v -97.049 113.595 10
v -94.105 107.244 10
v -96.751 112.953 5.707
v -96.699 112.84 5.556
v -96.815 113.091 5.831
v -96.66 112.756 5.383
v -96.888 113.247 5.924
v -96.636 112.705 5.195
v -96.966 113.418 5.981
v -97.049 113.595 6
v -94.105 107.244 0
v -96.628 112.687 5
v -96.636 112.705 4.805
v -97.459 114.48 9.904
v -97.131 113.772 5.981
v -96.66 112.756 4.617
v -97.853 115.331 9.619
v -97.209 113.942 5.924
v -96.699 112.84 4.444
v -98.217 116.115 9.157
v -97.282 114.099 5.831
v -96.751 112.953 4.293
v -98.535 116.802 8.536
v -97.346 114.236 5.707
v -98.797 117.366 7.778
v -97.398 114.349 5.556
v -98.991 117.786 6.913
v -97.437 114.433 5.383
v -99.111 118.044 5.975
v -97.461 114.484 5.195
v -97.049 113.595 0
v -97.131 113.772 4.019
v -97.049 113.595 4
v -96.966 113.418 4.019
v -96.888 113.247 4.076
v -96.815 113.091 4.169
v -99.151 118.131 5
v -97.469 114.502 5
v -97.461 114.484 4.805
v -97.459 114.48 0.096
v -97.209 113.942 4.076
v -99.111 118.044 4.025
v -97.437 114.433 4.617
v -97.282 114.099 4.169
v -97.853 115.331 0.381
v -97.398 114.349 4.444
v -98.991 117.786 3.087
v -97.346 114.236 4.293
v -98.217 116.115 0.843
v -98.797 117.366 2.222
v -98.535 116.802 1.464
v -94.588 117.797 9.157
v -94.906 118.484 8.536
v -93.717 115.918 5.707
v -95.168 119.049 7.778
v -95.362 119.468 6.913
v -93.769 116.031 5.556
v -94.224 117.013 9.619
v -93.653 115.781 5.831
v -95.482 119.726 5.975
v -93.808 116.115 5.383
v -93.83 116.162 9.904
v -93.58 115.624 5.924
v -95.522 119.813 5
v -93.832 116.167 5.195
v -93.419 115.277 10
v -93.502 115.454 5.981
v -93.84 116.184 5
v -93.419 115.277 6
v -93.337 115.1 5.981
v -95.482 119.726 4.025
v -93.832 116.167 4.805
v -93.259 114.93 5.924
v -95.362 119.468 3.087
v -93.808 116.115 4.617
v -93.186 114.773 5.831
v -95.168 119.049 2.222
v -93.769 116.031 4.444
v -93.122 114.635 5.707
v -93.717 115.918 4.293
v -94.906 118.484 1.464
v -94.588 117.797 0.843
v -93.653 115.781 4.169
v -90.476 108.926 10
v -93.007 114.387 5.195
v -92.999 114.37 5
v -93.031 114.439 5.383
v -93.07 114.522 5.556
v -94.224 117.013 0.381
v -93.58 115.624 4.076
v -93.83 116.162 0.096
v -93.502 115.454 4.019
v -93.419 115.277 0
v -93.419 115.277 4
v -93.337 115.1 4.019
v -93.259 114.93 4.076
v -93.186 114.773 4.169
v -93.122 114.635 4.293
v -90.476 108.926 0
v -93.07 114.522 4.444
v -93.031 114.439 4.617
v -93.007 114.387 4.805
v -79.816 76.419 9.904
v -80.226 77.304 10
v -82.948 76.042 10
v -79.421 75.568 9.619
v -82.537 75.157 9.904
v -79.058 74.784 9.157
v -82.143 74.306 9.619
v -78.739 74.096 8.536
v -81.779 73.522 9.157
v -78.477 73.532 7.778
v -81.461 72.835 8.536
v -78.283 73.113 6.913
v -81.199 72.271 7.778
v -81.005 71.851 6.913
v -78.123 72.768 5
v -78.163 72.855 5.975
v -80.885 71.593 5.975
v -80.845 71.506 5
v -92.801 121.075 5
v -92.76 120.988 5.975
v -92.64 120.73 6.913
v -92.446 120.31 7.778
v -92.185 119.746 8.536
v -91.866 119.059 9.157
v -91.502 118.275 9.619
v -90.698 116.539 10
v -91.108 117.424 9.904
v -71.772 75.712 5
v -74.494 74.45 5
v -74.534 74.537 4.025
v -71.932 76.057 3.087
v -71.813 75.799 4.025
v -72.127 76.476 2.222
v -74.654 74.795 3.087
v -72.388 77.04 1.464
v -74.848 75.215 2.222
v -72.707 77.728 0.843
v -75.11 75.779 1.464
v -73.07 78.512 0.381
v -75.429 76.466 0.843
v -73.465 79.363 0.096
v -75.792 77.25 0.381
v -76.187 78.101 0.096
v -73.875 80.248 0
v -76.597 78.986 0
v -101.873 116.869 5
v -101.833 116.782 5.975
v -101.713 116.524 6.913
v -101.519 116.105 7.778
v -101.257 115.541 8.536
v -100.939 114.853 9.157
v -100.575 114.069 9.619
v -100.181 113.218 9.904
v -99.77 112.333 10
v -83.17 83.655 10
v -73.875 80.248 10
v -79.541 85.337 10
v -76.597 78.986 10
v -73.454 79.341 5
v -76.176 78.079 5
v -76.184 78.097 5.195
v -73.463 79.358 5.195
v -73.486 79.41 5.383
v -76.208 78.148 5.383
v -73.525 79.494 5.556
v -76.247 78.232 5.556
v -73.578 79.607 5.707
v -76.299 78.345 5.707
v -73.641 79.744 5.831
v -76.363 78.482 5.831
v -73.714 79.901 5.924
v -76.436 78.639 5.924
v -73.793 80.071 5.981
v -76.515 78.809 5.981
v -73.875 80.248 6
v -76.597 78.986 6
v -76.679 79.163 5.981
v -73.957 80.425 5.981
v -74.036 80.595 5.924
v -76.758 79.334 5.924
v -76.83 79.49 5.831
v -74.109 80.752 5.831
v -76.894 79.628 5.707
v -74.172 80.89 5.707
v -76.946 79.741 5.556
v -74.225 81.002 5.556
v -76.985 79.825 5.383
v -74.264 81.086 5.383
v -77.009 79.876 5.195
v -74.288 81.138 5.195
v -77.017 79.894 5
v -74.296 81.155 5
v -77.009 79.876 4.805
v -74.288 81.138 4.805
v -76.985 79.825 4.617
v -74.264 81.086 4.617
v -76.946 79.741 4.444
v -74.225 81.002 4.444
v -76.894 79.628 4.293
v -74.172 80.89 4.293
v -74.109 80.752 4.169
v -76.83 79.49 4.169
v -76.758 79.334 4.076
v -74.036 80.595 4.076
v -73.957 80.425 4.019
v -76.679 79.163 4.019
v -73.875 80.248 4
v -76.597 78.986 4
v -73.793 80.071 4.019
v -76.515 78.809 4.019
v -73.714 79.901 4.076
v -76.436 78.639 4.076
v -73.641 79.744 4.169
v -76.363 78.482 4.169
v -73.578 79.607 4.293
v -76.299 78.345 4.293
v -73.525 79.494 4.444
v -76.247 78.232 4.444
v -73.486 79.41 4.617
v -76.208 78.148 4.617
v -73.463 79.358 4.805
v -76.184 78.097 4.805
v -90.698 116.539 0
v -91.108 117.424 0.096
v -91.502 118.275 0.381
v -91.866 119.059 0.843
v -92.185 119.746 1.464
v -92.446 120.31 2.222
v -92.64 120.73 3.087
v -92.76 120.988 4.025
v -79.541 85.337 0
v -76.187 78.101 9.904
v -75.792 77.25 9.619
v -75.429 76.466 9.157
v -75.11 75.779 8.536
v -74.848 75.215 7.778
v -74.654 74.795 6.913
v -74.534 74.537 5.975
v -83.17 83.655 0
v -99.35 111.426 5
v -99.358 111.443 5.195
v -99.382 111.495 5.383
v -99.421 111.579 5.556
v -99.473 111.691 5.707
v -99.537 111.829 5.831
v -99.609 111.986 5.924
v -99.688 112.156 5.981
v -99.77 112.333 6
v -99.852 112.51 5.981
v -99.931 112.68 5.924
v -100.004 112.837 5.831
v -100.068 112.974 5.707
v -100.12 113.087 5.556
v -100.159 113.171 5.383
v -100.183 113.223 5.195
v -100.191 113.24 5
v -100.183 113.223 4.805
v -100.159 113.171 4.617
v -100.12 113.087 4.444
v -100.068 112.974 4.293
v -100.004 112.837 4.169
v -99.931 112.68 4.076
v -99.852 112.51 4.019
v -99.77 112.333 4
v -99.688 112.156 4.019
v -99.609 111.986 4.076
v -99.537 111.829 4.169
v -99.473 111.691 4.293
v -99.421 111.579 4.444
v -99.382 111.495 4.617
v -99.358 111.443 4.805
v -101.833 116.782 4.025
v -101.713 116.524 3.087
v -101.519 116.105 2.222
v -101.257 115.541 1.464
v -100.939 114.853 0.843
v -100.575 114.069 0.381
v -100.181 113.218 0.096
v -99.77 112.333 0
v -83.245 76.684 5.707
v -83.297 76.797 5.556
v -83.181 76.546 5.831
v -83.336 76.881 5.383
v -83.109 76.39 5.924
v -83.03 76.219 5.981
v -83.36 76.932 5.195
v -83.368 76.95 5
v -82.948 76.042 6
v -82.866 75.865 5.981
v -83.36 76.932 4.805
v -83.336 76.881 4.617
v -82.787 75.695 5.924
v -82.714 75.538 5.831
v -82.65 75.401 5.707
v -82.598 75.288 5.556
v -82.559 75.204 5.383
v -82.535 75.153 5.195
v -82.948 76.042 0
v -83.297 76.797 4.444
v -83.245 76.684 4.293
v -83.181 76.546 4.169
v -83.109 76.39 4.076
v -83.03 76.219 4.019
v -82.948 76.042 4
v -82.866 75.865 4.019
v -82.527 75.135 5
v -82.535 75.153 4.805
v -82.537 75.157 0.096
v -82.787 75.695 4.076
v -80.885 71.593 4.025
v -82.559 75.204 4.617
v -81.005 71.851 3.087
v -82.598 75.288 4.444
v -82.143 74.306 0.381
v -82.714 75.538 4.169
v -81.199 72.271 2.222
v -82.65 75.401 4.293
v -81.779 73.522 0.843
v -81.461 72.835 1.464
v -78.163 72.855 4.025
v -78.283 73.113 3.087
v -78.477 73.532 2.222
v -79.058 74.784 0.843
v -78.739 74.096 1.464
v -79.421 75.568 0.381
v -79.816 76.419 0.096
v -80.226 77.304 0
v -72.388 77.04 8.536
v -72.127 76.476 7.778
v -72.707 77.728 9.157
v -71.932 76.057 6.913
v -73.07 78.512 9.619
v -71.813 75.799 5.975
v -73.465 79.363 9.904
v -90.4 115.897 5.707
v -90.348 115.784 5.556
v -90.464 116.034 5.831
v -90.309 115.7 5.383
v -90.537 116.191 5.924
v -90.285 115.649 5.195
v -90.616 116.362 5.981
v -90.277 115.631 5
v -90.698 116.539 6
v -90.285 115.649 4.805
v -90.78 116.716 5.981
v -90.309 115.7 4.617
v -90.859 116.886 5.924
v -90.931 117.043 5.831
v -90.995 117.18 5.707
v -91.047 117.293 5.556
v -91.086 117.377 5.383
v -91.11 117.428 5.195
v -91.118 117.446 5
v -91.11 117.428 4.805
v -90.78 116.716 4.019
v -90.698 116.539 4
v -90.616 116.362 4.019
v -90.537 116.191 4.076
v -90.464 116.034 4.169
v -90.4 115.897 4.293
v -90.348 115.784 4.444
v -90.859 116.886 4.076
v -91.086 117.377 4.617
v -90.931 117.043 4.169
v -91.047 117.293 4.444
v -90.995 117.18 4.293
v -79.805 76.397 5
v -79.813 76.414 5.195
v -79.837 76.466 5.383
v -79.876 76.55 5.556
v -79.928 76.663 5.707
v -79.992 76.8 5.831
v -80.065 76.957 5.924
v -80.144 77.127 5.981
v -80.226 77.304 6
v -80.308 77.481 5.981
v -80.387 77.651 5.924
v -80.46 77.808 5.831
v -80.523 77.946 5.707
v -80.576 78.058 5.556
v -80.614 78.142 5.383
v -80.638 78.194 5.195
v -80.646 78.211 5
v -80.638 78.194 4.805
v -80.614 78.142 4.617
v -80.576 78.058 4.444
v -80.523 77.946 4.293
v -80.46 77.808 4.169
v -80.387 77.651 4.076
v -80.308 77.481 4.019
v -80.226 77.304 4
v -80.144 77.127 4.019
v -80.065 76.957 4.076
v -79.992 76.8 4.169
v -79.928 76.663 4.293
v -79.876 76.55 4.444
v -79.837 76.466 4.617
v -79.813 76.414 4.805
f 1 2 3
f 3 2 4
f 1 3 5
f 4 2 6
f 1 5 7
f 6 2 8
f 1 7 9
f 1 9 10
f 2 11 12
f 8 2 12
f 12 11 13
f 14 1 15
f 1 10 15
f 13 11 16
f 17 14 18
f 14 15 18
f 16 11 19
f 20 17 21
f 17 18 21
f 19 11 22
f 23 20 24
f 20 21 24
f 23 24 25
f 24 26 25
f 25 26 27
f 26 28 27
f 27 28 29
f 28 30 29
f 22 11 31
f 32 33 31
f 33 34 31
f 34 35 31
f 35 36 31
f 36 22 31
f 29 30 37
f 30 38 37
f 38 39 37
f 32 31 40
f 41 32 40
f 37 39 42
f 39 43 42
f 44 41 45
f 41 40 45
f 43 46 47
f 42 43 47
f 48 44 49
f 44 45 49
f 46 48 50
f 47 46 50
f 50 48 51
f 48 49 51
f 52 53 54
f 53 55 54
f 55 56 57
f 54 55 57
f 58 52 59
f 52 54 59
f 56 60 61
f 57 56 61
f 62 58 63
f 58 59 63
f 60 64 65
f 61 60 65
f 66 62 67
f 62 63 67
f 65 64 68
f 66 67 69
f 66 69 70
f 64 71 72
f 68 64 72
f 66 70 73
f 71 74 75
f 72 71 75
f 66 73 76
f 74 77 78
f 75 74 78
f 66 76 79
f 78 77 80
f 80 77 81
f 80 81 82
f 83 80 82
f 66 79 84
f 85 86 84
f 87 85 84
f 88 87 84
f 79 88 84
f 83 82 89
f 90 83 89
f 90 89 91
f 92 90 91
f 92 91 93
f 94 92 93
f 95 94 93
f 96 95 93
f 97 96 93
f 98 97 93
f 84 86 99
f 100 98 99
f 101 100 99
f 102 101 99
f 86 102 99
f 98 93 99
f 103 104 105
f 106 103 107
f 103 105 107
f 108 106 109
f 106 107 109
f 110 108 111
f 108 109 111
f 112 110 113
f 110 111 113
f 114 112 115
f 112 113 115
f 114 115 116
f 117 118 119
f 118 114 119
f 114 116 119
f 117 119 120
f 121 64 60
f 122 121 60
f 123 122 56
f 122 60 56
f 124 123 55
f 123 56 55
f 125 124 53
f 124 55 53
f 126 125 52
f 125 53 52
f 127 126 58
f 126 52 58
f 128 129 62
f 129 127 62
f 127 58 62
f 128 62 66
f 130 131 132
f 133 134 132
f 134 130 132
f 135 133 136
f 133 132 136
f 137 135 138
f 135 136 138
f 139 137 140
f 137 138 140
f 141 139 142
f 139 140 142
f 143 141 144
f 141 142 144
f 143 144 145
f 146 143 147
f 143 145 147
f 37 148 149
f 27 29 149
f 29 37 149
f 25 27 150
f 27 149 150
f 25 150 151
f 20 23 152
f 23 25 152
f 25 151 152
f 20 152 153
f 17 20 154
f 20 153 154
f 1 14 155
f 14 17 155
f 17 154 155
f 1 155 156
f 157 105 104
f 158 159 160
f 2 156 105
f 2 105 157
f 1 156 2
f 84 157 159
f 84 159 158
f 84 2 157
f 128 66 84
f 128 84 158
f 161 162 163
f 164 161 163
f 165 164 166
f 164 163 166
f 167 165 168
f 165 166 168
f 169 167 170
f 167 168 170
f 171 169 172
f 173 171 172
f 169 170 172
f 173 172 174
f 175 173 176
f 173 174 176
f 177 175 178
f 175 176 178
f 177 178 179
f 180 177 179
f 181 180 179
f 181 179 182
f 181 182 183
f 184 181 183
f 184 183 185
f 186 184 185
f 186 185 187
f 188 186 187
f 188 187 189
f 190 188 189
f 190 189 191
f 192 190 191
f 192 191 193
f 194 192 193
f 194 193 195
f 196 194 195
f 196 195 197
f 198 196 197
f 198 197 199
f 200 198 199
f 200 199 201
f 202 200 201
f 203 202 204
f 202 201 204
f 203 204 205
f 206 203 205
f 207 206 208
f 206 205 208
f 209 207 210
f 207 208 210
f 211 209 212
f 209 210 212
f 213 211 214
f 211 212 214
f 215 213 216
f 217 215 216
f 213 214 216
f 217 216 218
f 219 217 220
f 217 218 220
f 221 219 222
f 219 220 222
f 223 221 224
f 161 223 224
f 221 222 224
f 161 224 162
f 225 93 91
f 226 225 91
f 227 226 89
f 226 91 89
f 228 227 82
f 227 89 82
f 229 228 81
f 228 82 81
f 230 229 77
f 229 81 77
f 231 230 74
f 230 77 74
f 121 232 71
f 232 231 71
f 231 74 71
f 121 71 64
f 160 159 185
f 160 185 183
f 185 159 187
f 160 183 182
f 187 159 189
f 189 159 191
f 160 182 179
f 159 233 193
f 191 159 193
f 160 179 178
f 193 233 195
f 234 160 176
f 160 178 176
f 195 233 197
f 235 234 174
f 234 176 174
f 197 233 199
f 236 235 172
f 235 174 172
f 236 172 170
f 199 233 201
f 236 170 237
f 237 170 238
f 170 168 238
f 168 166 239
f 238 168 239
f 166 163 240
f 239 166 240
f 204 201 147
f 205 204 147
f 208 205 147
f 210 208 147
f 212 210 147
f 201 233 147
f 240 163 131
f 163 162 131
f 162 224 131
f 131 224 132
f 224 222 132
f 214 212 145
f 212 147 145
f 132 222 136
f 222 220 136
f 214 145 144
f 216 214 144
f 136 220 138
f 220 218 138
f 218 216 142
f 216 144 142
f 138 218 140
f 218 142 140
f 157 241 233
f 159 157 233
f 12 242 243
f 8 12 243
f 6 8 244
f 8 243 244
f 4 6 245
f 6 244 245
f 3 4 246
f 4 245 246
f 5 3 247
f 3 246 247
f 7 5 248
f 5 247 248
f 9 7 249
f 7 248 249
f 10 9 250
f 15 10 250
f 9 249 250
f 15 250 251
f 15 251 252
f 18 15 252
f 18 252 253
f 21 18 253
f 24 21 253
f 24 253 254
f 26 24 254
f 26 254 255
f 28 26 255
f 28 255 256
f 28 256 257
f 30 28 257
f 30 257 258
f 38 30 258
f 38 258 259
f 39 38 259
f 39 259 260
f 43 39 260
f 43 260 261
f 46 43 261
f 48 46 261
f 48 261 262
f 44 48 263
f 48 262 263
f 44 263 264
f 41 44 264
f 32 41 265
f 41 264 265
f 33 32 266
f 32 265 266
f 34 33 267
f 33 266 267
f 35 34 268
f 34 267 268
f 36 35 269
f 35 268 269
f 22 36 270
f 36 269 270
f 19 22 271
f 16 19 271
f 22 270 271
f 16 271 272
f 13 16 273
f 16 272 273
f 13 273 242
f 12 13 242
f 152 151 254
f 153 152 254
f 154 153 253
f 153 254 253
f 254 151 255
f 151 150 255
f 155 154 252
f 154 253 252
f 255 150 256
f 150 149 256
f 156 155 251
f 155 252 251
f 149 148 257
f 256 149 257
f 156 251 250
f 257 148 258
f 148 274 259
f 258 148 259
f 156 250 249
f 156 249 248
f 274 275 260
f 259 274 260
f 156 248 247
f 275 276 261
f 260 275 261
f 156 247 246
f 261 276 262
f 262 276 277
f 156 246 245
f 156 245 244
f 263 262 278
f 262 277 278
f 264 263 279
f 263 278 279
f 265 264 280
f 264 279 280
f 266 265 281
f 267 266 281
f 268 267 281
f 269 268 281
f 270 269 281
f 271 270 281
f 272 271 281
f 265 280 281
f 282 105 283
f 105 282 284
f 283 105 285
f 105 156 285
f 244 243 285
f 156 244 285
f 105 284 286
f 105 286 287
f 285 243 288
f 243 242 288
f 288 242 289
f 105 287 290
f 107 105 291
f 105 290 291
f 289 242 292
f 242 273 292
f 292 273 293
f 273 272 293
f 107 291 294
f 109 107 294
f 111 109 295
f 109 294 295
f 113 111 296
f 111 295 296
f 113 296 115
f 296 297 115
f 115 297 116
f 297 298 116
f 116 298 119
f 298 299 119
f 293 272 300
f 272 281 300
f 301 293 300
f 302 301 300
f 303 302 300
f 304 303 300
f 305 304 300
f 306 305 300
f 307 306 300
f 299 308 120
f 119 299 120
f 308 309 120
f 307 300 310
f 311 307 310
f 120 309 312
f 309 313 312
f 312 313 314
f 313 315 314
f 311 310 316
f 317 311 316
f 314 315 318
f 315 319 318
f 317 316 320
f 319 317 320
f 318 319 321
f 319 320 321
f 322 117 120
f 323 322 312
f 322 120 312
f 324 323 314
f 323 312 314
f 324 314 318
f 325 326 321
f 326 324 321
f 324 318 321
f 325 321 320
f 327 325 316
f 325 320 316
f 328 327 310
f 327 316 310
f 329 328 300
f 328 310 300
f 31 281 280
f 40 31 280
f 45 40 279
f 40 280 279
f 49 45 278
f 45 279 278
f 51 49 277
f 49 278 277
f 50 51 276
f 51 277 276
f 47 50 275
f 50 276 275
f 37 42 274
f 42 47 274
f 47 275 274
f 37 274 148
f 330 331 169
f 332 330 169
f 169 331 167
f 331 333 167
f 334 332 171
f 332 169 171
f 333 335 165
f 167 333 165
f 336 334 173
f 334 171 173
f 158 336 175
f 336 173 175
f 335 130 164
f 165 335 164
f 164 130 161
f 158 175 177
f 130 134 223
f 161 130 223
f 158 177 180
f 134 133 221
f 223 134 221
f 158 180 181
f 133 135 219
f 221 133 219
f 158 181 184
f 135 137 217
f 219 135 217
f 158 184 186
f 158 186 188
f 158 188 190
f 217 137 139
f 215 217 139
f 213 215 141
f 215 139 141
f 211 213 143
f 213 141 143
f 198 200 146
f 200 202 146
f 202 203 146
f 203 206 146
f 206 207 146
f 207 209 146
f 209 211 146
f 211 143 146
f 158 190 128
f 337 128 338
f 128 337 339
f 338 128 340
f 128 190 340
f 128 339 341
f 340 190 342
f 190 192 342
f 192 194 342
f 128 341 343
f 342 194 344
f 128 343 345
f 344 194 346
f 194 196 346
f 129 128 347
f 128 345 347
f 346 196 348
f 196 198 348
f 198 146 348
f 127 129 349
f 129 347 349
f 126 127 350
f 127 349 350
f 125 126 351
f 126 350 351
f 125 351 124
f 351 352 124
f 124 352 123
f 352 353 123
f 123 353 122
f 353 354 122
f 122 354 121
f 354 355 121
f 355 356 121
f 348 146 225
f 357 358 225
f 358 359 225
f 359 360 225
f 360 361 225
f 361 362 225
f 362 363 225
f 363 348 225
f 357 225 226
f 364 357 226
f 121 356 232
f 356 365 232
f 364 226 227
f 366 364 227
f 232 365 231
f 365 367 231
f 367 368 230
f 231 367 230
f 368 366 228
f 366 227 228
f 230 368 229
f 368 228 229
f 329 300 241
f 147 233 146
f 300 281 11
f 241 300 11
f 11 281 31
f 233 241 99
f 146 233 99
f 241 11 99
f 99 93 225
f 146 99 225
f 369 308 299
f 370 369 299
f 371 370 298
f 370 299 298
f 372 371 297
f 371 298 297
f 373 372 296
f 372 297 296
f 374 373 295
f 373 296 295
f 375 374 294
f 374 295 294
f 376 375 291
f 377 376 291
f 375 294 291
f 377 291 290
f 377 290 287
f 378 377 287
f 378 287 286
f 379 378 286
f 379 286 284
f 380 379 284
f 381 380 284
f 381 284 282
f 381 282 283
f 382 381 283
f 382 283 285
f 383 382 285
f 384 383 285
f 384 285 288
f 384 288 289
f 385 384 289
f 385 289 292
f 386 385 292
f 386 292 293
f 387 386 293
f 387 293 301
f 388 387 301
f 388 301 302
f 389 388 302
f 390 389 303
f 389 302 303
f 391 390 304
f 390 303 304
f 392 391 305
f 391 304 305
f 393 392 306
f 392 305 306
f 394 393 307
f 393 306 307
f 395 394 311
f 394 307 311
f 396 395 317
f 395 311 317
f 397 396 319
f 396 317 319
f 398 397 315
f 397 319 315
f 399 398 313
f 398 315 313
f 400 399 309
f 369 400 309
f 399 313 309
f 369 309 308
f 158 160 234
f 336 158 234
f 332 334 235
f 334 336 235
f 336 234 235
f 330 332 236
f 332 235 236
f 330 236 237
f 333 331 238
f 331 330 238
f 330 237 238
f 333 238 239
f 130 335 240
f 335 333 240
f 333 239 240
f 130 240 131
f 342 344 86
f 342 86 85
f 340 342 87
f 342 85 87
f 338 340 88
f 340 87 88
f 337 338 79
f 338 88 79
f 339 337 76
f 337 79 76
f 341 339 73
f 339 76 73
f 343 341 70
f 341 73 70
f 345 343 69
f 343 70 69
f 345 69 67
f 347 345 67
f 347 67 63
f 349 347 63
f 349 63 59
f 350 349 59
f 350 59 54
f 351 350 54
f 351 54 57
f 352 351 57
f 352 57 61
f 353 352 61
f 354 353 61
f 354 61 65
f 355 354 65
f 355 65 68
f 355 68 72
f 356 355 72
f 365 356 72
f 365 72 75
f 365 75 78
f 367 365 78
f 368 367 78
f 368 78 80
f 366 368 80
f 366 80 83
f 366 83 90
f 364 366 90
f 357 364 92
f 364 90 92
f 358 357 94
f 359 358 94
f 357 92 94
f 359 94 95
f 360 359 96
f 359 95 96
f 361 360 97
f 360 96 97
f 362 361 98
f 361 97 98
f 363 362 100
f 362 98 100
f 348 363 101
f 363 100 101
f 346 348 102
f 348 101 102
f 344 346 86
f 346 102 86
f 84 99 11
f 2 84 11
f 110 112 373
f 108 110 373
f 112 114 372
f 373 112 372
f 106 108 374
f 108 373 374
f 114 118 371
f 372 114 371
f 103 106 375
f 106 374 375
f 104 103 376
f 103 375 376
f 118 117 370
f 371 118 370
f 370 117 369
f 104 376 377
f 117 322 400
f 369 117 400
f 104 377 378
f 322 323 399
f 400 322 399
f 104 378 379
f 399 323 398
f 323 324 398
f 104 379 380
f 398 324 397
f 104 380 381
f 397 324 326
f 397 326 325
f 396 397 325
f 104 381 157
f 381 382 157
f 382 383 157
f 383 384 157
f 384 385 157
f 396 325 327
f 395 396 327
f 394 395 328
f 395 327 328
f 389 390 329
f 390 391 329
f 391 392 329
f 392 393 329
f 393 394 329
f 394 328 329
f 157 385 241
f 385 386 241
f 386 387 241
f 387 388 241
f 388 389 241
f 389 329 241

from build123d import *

# Parameters (mm, degrees)
BOSS_EXTRU_1_DEPTH      = 10
ESQUISSE2_R             = 1
ENL_V_MAT_EXTRU_1_DEPTH = 20


with BuildPart() as part:
    # Esquisse1 → Boss.-Extru.1 (new body)
    with BuildSketch(Plane.XY):
        Polygon((-99.151357472, 118.130872671), (-101.873142366, 116.869172631), (-80.844808358, 71.506091068), (-78.123023465, 72.767791109), (-83.169823626, 83.654930684), (-79.540777101, 85.337197404), (-74.49397694, 74.450057829), (-71.772192046, 75.71175787), (-92.800526053, 121.074839432), (-95.522310947, 119.813139392), (-90.475510785, 108.925999817), (-94.10455731, 107.243733096), align=None)
    extrude(amount=BOSS_EXTRU_1_DEPTH)

    # Esquisse2 → Enlèv. mat.-Extru.1 (cut)
    with BuildSketch(Plane(origin=(-39.261124148, -18.199734313, 0), x_dir=(0, 0, 1), z_dir=(-0.9072616312569982, -0.42056668014583676, 0))):
        with BuildLine():
            ThreePointArc((0, 143.875365486), (1.464466094, 147.410899392), (5, 148.875365486))
            Line((5, 148.875365486), (0, 148.875365486))
            Line((0, 148.875365486), (0, 143.875365486))
        make_face()
        with BuildLine():
            ThreePointArc((5, 148.875365486), (8.535533906, 147.410899392), (10, 143.875365486))
            Line((10, 143.875365486), (10, 148.875365486))
            Line((10, 148.875365486), (5, 148.875365486))
        make_face()
        with Locations(Location((5, 143.875365486, 0), (0, 0, 270))):
            Circle(ESQUISSE2_R)
        with BuildLine():
            Line((10, 98.875365486), (10, 103.875365486))
            ThreePointArc((10, 103.875365486), (8.535533906, 100.33983158), (5, 98.875365486))
            Line((5, 98.875365486), (10, 98.875365486))
        make_face()
        with BuildLine():
            Line((0, 98.875365486), (5, 98.875365486))
            ThreePointArc((5, 98.875365486), (1.464466094, 100.33983158), (0, 103.875365486))
            Line((0, 103.875365486), (0, 98.875365486))
        make_face()
        with Locations(Location((5, 103.875365486, 0), (0, 0, 270))):
            Circle(ESQUISSE2_R)
    extrude(amount=-ENL_V_MAT_EXTRU_1_DEPTH, mode=Mode.SUBTRACT)


solid = part.part
